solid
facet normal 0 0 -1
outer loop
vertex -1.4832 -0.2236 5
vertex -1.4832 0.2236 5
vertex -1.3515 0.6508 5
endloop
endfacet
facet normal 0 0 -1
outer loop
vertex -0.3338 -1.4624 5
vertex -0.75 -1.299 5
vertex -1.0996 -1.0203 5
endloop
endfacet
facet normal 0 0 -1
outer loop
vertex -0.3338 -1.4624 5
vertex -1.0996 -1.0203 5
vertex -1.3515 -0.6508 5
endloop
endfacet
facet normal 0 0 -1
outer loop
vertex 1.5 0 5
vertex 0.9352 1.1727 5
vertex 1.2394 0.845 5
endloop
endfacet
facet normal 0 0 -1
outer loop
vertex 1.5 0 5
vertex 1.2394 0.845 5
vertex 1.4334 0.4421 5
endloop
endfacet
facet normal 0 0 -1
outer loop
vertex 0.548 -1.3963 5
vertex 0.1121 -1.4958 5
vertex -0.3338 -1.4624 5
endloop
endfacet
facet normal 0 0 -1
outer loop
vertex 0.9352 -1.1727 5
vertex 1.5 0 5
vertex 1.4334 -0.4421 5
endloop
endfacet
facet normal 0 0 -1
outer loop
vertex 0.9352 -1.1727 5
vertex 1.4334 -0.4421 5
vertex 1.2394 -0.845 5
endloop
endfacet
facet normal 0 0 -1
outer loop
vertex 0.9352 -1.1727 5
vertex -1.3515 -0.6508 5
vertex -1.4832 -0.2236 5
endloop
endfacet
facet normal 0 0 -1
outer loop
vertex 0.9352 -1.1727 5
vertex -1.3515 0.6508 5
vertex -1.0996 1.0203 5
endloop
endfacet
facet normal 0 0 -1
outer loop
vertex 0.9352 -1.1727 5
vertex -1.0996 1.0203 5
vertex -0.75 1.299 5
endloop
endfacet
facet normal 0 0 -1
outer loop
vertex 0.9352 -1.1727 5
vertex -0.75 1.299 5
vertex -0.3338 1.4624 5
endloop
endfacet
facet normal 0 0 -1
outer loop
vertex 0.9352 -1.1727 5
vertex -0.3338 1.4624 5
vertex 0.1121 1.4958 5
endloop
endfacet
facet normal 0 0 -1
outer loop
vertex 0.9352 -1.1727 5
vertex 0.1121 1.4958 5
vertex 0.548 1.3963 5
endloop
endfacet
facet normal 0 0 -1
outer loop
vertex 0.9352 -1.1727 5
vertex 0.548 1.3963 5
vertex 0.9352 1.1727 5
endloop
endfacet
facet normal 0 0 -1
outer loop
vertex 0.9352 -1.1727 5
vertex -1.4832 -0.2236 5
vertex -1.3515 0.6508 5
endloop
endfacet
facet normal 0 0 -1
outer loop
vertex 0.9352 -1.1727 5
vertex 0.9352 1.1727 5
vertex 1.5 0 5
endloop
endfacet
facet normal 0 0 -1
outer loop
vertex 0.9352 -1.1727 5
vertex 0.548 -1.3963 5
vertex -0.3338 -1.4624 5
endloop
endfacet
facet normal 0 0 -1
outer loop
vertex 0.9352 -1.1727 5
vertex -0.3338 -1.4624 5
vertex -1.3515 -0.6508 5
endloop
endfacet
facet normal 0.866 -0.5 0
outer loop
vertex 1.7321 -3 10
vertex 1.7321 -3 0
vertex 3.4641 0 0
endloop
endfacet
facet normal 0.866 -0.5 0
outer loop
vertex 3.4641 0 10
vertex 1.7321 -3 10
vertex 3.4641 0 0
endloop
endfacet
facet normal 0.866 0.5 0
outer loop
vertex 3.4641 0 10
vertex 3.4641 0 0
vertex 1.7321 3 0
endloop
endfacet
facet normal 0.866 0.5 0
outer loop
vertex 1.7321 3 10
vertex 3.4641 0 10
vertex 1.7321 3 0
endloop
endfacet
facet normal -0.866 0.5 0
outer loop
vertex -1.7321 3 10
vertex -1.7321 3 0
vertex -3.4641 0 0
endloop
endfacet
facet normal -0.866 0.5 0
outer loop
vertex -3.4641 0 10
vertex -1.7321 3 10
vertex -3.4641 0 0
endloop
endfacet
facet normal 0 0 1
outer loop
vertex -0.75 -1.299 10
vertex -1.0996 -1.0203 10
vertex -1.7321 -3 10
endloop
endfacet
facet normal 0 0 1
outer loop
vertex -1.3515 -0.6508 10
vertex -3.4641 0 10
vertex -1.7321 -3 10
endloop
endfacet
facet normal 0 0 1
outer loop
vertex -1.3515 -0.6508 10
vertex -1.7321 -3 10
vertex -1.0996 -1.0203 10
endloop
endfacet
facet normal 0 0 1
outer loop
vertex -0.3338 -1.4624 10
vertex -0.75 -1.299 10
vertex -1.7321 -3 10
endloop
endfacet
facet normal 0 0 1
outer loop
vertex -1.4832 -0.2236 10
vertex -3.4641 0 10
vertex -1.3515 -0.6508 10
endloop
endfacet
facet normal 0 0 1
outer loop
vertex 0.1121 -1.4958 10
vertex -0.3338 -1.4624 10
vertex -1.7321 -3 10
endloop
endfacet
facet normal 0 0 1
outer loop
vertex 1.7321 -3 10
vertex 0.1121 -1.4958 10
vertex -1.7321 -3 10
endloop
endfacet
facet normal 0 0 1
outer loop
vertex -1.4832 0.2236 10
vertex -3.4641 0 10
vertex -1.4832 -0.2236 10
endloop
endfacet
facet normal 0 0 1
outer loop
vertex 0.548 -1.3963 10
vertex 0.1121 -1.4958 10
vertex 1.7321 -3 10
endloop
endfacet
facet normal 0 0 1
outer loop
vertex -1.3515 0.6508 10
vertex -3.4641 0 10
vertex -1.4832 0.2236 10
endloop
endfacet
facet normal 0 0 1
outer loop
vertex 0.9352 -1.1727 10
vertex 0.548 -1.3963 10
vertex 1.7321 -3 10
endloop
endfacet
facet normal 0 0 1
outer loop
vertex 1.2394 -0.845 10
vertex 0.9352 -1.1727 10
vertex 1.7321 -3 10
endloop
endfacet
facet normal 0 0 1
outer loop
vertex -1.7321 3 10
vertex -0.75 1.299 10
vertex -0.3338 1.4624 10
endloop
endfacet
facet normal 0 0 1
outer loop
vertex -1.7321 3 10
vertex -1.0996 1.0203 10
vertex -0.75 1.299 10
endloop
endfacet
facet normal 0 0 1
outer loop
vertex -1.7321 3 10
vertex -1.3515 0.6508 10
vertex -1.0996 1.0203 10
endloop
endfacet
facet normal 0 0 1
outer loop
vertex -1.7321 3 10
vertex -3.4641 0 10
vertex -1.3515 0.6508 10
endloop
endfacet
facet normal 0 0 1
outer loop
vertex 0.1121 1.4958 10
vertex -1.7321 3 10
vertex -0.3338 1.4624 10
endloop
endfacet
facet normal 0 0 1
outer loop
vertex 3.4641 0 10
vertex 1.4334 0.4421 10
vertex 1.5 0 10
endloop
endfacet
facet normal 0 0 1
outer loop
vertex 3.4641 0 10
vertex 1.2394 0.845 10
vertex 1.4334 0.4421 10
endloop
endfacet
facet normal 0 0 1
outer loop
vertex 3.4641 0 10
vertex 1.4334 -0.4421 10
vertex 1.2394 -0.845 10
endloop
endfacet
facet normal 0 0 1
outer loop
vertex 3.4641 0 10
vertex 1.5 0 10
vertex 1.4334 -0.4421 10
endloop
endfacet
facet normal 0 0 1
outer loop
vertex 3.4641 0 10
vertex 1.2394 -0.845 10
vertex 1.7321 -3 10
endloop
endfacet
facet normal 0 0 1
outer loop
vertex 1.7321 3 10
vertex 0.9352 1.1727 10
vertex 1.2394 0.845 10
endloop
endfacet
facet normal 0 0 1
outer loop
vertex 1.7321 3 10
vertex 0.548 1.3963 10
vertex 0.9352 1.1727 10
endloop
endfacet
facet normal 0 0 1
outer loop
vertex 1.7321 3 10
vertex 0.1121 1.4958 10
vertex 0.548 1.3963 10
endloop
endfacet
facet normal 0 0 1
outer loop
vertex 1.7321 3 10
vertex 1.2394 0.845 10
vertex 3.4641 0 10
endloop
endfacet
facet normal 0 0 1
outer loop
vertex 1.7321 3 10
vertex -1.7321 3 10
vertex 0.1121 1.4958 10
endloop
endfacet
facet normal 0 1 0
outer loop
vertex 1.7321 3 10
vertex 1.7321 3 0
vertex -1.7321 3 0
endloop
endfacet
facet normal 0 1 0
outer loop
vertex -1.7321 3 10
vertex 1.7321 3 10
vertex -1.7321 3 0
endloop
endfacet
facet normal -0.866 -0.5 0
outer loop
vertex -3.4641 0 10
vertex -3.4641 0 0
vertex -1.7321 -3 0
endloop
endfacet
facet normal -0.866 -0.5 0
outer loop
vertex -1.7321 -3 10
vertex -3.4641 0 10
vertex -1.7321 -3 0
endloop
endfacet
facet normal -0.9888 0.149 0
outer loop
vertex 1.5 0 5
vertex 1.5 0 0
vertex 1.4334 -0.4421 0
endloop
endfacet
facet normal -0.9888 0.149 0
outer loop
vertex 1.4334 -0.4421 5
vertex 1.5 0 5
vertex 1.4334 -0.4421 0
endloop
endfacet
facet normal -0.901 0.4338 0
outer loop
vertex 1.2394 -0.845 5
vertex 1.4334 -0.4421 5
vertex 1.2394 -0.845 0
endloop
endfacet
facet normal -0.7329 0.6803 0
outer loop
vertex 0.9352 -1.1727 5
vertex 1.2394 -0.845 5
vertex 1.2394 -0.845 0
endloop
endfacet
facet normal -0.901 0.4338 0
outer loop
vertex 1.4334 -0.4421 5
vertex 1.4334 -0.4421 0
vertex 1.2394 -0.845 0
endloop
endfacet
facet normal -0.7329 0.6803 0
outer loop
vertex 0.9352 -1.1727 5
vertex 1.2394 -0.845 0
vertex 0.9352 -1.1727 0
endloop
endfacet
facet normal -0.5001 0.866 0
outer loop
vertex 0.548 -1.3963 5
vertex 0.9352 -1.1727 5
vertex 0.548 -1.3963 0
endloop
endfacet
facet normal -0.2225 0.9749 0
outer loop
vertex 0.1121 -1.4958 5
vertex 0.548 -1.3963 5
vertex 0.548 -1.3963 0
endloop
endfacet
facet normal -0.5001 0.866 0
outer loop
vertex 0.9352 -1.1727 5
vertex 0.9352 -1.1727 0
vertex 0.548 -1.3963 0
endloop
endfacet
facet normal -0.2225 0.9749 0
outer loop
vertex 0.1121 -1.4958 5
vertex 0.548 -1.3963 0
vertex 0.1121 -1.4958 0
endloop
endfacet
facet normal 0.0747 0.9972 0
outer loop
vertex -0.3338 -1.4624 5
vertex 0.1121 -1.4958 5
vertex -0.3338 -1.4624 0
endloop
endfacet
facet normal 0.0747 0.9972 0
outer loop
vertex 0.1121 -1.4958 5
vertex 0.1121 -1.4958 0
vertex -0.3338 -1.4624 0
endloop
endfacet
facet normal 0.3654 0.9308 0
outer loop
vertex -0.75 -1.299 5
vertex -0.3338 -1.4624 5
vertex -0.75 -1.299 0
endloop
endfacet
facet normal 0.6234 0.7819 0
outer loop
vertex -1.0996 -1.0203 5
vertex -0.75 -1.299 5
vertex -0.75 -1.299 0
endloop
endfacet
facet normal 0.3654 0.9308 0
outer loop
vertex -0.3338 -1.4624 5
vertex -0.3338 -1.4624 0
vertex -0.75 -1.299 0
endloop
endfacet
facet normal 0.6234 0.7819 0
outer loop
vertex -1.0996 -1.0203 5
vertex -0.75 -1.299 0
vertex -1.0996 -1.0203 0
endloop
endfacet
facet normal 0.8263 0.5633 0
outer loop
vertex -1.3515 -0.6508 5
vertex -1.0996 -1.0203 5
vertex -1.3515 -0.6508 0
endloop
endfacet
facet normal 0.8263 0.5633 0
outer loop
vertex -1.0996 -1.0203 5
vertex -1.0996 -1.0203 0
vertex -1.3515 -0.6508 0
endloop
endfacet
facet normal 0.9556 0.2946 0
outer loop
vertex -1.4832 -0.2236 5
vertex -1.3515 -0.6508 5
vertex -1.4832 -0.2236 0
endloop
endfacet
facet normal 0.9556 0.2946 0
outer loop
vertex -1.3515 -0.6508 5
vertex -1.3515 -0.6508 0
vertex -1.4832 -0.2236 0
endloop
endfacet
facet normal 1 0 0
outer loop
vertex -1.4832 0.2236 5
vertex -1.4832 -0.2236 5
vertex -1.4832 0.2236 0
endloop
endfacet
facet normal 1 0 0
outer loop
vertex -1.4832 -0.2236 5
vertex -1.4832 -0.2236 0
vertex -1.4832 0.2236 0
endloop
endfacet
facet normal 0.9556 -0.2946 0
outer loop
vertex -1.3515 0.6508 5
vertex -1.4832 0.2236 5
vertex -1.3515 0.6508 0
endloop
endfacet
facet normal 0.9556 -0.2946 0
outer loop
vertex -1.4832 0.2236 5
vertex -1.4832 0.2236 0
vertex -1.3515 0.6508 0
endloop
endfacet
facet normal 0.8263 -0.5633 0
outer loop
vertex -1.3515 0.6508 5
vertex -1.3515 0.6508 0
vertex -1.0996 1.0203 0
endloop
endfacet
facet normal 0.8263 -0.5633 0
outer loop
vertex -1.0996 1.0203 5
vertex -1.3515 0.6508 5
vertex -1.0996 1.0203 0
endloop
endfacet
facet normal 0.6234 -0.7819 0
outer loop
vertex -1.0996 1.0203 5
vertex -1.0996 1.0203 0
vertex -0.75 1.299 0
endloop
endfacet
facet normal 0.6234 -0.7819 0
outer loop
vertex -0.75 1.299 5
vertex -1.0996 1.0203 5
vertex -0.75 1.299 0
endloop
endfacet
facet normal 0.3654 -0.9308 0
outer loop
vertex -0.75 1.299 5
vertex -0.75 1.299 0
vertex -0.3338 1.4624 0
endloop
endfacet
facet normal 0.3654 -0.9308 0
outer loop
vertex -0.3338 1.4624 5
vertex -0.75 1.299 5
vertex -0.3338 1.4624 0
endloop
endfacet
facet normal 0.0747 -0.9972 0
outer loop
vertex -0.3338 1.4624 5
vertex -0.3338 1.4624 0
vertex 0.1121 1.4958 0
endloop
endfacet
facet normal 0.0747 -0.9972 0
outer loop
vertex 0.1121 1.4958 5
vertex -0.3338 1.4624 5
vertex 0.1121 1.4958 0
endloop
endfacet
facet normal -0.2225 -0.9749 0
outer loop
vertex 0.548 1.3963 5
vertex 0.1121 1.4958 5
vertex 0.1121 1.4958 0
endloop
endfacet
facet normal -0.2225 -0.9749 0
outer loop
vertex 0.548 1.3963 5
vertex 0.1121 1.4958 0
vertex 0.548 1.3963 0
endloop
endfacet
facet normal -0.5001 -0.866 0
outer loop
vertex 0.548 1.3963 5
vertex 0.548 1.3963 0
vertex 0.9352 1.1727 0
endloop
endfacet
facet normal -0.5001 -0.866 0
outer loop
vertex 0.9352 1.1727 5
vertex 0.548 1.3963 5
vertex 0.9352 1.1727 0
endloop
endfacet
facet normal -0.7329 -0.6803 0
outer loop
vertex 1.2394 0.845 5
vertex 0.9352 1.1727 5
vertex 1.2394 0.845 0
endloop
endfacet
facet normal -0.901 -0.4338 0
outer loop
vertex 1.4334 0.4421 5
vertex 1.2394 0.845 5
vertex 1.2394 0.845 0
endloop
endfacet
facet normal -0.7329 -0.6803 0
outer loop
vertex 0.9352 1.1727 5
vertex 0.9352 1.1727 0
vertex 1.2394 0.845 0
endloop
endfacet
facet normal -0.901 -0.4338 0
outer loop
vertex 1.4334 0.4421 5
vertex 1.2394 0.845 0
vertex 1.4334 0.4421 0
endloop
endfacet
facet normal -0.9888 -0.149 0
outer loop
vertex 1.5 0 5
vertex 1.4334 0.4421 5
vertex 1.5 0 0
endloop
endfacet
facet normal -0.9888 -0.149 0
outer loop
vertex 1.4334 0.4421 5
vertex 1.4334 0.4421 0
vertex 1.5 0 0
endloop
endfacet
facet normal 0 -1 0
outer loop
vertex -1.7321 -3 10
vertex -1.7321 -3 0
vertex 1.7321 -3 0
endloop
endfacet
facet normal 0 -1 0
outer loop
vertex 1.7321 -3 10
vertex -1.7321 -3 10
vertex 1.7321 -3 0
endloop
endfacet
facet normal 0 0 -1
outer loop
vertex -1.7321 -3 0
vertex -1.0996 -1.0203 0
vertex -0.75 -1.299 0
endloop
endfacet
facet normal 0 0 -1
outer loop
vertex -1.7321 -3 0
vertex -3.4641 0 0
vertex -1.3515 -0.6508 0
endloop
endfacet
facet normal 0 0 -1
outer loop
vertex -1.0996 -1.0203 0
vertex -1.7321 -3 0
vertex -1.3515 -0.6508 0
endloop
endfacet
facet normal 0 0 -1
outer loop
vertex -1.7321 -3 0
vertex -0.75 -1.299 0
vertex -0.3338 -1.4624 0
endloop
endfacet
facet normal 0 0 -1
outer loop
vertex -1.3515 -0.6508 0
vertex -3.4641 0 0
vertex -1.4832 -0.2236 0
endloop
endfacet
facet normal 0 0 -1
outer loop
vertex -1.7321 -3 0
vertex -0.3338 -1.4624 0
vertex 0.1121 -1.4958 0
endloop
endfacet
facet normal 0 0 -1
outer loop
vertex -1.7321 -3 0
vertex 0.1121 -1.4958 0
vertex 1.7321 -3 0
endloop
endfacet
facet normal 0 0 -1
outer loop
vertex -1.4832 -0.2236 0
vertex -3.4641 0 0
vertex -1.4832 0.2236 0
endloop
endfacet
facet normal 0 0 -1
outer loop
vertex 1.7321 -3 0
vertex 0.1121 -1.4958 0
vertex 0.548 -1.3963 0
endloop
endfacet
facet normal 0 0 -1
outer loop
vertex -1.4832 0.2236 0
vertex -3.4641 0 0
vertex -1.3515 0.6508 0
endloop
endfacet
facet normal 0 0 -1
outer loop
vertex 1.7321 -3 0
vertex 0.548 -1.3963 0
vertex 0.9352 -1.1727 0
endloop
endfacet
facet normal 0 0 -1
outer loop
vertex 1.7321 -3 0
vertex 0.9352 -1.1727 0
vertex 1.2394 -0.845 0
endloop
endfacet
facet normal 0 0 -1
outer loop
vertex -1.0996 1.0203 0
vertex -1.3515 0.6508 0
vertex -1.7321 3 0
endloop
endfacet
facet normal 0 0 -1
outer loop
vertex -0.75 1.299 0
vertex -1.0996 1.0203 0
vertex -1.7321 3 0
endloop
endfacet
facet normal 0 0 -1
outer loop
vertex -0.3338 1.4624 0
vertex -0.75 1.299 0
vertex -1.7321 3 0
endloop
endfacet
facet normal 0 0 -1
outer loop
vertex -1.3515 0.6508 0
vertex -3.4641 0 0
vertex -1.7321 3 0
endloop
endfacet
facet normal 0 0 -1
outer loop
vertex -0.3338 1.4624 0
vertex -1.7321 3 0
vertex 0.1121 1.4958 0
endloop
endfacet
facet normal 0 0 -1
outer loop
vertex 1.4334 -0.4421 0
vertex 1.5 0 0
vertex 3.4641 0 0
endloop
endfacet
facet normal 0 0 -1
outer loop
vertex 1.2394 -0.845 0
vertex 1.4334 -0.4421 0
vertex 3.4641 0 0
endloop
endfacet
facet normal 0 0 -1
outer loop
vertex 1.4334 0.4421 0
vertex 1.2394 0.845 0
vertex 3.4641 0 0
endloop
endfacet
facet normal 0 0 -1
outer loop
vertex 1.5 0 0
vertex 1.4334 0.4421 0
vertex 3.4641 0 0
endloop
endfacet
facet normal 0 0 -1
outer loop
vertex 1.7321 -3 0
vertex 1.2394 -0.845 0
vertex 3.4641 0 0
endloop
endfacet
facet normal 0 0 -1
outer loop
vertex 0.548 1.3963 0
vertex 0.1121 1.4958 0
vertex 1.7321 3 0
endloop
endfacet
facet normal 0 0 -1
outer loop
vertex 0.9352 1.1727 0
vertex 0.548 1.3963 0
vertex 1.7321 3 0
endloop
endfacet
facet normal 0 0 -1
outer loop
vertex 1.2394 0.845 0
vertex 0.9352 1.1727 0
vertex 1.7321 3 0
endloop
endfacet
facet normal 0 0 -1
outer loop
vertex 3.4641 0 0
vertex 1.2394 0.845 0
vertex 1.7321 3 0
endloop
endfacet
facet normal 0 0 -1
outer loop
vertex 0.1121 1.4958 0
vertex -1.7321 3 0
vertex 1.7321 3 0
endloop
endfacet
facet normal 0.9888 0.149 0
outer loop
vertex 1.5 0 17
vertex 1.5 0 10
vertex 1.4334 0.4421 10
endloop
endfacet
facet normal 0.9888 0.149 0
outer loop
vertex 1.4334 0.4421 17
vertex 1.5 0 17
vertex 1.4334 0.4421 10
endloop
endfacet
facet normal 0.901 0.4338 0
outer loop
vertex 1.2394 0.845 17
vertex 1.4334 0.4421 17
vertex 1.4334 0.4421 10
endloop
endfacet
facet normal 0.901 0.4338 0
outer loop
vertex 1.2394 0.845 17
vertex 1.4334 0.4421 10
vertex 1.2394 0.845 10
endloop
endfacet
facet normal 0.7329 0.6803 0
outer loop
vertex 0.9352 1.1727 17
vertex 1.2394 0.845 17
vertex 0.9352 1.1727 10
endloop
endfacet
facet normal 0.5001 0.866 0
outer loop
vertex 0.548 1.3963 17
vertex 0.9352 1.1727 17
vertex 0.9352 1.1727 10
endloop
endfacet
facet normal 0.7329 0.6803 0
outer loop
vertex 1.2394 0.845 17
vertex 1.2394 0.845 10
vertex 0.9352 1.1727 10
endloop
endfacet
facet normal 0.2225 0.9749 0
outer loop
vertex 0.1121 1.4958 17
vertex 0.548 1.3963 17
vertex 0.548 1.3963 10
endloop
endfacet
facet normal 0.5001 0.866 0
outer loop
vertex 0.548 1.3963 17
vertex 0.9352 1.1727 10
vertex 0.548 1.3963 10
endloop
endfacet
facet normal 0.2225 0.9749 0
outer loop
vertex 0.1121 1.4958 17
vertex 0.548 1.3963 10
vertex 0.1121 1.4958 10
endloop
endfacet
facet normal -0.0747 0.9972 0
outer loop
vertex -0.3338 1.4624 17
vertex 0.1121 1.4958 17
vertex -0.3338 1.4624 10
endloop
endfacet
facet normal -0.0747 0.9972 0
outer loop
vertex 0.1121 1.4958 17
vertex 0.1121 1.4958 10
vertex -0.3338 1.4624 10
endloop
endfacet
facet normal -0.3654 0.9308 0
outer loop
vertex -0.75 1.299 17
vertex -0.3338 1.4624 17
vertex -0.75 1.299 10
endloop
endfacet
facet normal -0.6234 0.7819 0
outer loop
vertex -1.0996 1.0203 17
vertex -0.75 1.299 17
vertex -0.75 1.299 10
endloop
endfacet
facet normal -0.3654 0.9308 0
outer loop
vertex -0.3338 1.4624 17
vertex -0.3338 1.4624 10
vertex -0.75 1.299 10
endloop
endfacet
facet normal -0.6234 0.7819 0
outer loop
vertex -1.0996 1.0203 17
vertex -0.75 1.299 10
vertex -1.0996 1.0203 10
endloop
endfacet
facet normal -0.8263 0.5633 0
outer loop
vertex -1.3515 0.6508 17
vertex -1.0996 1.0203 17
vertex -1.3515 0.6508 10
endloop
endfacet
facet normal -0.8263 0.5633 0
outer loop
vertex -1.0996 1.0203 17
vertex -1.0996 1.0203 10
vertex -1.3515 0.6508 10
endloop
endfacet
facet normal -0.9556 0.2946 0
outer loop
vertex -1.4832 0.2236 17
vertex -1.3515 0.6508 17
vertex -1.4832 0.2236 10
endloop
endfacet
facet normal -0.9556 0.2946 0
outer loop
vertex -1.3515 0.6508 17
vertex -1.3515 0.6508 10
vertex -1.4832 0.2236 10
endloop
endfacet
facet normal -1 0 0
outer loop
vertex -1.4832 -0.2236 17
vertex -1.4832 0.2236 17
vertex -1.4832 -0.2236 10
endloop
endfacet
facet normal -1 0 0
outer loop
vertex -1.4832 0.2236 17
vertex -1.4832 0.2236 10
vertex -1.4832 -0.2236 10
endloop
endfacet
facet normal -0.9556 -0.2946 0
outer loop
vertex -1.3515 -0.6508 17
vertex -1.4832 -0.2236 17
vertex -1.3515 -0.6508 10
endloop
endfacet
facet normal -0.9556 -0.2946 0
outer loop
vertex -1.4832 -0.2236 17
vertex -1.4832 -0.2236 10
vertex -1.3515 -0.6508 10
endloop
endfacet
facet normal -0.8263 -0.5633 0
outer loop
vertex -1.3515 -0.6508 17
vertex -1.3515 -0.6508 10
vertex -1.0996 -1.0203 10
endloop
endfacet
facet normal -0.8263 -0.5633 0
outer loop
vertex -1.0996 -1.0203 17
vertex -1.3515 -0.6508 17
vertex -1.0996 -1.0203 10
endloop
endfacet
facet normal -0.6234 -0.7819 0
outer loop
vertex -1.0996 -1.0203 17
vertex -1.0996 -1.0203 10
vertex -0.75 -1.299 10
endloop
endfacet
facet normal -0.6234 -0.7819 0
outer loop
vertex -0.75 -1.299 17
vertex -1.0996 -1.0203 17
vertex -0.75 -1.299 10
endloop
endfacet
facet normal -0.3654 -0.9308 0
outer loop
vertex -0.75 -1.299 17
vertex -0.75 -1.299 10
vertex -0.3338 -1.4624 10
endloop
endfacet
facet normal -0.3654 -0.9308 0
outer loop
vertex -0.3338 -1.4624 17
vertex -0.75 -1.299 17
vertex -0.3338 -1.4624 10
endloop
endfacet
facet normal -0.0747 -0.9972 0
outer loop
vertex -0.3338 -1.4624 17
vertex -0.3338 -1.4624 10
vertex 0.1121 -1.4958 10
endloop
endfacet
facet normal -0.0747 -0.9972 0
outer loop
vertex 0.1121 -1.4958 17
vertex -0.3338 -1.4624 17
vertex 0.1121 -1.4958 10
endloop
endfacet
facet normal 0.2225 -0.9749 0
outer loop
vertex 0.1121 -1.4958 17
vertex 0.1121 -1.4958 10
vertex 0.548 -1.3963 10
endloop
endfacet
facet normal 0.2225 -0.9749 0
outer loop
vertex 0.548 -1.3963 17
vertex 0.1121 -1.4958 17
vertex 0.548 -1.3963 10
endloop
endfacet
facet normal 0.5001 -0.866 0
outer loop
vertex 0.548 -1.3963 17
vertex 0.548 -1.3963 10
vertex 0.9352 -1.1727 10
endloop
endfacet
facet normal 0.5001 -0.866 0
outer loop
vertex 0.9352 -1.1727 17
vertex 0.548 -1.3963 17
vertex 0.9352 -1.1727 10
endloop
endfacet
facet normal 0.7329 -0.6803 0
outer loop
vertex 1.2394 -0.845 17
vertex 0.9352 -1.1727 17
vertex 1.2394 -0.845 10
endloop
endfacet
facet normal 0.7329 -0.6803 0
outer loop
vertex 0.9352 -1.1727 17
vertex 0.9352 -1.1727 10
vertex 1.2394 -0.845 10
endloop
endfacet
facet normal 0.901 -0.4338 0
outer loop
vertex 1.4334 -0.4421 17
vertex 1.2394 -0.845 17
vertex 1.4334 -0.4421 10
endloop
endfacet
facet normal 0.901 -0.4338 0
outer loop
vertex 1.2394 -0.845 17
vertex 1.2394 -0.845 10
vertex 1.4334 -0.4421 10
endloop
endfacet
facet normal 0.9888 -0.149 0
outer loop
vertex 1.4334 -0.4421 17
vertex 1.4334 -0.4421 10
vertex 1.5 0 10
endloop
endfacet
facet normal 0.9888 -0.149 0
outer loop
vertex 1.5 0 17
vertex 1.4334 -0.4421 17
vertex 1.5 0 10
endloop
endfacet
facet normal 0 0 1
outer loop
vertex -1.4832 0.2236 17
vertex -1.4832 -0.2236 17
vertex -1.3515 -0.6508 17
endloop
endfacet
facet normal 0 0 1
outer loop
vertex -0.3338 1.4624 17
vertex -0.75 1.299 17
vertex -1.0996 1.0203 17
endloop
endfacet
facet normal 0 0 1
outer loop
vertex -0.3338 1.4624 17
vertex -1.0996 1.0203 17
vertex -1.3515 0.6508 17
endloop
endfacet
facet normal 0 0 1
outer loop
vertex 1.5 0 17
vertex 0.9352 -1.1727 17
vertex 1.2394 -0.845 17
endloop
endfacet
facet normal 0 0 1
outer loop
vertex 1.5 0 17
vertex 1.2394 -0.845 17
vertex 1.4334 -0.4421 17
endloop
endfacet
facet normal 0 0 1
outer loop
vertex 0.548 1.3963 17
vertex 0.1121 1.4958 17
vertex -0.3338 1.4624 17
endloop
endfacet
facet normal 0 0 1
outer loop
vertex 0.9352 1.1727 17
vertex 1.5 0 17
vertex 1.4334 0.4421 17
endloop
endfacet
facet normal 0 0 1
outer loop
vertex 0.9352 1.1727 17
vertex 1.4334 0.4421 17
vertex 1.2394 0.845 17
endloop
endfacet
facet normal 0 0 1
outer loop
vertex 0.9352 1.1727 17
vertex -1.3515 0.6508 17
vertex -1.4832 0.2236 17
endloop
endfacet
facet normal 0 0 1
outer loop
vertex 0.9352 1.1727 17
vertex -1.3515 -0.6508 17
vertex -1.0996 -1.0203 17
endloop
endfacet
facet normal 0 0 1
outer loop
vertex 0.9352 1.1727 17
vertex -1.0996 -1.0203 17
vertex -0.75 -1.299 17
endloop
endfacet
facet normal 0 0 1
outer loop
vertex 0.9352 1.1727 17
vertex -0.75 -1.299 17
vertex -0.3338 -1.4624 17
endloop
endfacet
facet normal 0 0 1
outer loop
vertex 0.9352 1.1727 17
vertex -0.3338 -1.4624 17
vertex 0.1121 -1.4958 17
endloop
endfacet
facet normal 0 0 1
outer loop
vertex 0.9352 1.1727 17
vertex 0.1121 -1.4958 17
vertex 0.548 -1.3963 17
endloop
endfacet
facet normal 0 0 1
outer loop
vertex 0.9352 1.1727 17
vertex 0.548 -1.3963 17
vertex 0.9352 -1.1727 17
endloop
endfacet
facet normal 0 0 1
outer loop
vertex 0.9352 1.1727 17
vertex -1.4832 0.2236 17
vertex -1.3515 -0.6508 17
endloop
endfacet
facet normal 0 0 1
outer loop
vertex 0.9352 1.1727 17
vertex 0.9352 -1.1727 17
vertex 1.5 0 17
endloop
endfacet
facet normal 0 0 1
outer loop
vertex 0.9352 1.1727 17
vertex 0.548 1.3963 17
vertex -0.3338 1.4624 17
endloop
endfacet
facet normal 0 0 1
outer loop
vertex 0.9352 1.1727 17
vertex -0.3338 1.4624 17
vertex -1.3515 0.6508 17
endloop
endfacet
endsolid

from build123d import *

# Parameters (mm, degrees)
F1_DEPTH = 10
F2_R     = 1.5
F3_DEPTH = 7
F4_R     = 1.5
F5_DEPTH = 5


with BuildPart() as f1:
    # F0 (on Top) → F1 (new body)
    with BuildSketch(Plane.XY):
        Polygon((1.7320508076, 3), (-1.7320508076, 3), (-3.4641016151, 0), (-1.7320508076, -3), (1.7320508076, -3), (3.4641016151, 0), align=None)
    extrude(amount=F1_DEPTH)

    # F2 (on face) → F3 (join)
    with BuildSketch(Plane.XY.offset(10)):
        Circle(F2_R)
    extrude(amount=F3_DEPTH)

    # F4 (on face) → F5 (cut)
    with BuildSketch(Plane(origin=(0, 0, 0), x_dir=(1, 0, 0), z_dir=(0, 0, -1))):
        Circle(F4_R)
    extrude(amount=-F5_DEPTH, mode=Mode.SUBTRACT)


solid = f1.part
